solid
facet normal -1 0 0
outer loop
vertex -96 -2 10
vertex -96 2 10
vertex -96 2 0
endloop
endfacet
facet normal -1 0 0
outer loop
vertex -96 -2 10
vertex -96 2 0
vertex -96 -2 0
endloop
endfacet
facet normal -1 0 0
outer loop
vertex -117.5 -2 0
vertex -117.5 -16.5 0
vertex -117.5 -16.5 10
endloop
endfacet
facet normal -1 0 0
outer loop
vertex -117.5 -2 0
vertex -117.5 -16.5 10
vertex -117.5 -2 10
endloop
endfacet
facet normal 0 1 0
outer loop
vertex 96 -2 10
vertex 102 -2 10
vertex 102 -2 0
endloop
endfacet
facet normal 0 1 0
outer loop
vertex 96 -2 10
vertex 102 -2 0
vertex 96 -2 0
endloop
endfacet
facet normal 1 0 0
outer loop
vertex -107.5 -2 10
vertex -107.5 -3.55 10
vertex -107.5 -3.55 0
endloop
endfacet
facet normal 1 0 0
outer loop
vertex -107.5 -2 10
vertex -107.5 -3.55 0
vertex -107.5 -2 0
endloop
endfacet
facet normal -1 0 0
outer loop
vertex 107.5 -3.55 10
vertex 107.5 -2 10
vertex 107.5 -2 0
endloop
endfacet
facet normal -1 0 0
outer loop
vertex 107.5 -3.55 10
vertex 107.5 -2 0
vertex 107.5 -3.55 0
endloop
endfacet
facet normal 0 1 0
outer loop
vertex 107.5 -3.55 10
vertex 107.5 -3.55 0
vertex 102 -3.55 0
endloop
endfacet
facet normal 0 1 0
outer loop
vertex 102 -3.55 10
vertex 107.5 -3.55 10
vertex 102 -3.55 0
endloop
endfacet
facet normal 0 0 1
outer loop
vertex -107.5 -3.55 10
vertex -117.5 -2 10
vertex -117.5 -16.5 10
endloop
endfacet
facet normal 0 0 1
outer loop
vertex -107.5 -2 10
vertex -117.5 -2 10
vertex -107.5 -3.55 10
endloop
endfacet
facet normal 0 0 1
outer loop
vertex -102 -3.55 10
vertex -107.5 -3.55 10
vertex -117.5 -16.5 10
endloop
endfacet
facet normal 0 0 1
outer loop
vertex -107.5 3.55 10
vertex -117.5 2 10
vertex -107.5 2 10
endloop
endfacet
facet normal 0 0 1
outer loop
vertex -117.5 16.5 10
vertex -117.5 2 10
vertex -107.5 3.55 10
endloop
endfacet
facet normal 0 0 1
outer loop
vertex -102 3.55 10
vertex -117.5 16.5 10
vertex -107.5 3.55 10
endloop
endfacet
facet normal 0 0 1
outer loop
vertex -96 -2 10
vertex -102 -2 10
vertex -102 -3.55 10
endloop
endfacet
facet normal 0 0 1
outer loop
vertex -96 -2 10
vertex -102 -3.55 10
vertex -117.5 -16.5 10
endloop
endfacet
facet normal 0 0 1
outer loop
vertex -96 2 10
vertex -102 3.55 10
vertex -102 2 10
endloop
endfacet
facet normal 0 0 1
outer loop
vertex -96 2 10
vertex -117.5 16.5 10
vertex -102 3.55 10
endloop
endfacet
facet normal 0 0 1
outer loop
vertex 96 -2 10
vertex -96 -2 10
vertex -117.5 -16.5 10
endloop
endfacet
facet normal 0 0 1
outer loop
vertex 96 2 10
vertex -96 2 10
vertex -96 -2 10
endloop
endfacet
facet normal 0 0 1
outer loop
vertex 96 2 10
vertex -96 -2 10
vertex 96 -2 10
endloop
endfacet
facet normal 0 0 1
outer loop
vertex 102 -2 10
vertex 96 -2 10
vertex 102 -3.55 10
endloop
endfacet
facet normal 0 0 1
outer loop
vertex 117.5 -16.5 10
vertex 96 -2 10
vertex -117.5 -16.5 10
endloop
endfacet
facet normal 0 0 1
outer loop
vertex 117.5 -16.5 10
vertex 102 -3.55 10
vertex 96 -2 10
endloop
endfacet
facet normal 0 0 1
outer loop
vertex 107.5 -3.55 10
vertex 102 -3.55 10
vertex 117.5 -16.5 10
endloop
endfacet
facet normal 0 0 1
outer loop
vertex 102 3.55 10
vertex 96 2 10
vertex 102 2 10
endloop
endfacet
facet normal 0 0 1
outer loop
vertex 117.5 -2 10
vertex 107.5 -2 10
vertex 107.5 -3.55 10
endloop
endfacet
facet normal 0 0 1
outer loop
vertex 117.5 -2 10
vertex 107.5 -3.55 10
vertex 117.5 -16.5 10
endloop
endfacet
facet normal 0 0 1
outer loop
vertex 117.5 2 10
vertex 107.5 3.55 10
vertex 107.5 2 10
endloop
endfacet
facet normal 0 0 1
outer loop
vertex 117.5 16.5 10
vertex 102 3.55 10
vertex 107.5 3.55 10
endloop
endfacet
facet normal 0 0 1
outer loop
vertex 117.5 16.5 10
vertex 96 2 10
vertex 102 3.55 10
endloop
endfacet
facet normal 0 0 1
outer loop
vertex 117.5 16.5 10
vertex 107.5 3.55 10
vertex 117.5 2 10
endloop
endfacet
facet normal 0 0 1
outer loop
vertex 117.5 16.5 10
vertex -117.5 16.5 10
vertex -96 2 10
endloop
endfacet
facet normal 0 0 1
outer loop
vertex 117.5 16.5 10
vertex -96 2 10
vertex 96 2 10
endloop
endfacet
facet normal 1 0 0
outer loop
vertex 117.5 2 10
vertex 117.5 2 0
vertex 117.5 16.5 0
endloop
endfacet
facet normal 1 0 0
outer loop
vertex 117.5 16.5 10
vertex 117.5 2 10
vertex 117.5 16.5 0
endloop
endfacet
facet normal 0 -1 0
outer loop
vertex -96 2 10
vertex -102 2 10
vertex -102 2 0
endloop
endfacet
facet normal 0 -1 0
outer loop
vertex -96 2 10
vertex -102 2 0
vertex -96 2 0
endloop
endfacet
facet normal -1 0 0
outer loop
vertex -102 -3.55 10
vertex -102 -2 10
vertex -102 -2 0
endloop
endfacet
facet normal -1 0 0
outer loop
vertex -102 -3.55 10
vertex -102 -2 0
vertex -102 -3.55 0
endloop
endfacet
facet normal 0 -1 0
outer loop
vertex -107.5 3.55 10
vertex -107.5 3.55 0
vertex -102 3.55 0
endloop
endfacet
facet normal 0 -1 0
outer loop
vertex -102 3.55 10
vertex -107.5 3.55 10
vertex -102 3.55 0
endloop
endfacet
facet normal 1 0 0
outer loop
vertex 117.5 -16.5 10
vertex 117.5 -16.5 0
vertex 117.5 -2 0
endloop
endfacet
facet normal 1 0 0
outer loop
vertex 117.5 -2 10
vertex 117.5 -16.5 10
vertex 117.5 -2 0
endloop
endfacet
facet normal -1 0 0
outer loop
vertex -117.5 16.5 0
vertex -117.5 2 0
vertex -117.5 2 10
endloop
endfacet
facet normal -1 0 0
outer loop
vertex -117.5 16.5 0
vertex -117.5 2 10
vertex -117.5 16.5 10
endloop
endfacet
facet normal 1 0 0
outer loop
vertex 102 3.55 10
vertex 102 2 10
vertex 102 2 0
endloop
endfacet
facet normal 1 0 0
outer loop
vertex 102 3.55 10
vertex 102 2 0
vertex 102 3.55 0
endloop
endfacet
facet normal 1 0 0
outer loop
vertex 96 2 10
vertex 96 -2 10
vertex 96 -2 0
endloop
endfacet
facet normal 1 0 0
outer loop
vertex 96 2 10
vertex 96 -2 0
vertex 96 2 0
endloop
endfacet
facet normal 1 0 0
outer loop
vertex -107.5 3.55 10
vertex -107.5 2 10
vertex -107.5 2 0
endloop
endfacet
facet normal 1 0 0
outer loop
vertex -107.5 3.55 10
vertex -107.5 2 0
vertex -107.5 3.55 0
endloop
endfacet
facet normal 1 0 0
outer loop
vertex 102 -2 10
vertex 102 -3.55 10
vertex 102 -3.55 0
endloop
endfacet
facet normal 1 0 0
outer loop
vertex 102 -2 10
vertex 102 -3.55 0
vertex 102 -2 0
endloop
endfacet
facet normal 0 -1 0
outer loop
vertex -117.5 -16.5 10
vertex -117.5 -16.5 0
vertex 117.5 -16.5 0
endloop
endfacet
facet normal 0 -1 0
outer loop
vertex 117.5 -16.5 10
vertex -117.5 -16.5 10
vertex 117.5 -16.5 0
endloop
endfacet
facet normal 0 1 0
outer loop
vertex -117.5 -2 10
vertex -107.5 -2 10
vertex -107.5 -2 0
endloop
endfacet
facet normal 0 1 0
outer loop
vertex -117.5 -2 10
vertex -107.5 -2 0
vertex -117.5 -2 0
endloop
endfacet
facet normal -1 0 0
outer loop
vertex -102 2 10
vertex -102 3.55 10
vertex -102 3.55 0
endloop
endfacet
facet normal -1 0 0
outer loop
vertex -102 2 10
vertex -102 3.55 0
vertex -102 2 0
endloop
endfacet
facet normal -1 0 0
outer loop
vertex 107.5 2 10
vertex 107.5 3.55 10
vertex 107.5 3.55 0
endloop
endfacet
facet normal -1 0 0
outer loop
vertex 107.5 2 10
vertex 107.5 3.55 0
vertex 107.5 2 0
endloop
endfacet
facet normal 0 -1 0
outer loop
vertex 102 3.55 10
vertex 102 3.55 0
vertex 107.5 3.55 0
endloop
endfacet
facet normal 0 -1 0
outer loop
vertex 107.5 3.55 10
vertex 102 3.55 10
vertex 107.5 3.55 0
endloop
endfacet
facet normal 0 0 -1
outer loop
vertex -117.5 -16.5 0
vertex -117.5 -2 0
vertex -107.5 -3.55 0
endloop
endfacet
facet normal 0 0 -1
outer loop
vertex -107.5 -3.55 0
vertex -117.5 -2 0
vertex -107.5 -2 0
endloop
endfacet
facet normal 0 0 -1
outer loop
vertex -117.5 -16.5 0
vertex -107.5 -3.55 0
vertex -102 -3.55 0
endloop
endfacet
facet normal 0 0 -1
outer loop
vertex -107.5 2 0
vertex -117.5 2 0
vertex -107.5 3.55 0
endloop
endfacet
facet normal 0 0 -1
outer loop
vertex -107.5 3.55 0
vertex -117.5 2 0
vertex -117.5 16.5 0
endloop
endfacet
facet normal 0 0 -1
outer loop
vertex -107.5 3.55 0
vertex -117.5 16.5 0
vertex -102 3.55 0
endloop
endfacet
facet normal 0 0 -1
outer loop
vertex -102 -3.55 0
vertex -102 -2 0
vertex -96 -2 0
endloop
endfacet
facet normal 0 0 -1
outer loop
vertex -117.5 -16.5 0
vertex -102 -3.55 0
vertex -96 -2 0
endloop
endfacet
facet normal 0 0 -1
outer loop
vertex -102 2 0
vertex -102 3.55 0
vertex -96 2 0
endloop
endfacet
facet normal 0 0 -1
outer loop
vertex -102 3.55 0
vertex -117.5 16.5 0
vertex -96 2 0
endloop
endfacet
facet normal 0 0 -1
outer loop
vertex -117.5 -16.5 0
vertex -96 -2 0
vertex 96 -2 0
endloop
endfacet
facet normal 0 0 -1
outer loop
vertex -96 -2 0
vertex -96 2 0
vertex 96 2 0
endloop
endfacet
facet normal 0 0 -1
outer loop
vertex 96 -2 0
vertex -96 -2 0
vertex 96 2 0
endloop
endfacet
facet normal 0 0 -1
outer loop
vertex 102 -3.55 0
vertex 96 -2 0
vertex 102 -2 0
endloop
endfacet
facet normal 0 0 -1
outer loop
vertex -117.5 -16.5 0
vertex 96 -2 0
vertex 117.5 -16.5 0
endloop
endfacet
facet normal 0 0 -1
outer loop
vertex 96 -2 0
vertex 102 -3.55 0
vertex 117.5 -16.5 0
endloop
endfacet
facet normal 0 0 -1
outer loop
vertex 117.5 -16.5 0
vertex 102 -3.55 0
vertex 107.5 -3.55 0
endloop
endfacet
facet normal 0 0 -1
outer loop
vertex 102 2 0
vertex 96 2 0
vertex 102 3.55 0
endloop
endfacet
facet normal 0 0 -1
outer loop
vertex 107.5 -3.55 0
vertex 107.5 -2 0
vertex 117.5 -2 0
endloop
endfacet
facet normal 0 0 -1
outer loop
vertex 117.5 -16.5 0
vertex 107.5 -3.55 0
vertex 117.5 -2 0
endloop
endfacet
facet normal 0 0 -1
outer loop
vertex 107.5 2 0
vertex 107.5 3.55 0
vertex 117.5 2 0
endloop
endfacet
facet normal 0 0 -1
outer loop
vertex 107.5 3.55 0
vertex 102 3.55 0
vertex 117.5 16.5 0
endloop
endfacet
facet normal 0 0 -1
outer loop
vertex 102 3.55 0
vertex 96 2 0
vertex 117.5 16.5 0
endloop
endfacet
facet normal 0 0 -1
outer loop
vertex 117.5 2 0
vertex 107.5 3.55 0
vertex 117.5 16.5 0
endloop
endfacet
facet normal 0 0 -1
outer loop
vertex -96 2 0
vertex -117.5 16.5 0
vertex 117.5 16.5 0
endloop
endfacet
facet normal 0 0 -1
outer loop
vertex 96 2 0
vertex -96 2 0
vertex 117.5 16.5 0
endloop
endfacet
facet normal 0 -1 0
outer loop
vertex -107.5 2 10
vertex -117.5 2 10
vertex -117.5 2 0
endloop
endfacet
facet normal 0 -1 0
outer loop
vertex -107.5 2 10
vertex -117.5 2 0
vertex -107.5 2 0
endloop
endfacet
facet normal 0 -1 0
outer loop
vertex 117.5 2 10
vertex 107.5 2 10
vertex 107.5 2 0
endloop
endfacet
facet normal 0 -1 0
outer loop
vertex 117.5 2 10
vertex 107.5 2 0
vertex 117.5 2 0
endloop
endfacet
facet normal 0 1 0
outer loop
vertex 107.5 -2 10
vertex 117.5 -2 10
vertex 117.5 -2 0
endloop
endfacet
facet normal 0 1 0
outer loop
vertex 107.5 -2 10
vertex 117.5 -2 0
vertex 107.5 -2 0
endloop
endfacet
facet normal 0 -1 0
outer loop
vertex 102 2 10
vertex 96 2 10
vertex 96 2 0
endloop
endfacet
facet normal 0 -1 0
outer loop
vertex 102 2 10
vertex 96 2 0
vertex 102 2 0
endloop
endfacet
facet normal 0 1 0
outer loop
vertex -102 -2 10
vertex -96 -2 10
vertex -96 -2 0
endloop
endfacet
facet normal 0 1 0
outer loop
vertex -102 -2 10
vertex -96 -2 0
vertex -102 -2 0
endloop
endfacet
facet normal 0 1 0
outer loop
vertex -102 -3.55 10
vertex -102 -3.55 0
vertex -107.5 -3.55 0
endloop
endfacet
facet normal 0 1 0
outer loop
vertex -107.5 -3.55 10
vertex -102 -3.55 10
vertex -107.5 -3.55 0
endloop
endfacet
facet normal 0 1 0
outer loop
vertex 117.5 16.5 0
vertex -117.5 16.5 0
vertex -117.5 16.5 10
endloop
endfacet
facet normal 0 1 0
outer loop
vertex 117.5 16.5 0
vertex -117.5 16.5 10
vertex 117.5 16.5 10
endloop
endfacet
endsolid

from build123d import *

# Parameters (mm, degrees)
ESQUISSE1_W             = 235
ESQUISSE1_H             = 33
BOSS_EXTRU_1_DEPTH      = 10
ENL_V_MAT_EXTRU_1_DEPTH = 10


with BuildPart() as part:
    # Esquisse1 → Boss.-Extru.1 (new body)
    with BuildSketch(Plane.XY):
        Rectangle(ESQUISSE1_W, ESQUISSE1_H)
    extrude(amount=BOSS_EXTRU_1_DEPTH)

    # Esquisse2 → Enlèv. mat.-Extru.1 (cut)
    with BuildSketch(Plane.XY.offset(10)):
        Polygon((-117.5, 2), (-107.5, 2), (-107.5, 3.55), (-102, 3.55), (-102, 2), (-96, 2), (-96, -2), (-102, -2), (-102, -3.55), (-107.5, -3.55), (-107.5, -2), (-117.5, -2), align=None)
        Polygon((117.5, -2), (107.5, -2), (107.5, -3.55), (102, -3.55), (102, -2), (96, -2), (96, 2), (102, 2), (102, 3.55), (107.5, 3.55), (107.5, 2), (117.5, 2), align=None)
    extrude(amount=-ENL_V_MAT_EXTRU_1_DEPTH, mode=Mode.SUBTRACT)


solid = part.part
